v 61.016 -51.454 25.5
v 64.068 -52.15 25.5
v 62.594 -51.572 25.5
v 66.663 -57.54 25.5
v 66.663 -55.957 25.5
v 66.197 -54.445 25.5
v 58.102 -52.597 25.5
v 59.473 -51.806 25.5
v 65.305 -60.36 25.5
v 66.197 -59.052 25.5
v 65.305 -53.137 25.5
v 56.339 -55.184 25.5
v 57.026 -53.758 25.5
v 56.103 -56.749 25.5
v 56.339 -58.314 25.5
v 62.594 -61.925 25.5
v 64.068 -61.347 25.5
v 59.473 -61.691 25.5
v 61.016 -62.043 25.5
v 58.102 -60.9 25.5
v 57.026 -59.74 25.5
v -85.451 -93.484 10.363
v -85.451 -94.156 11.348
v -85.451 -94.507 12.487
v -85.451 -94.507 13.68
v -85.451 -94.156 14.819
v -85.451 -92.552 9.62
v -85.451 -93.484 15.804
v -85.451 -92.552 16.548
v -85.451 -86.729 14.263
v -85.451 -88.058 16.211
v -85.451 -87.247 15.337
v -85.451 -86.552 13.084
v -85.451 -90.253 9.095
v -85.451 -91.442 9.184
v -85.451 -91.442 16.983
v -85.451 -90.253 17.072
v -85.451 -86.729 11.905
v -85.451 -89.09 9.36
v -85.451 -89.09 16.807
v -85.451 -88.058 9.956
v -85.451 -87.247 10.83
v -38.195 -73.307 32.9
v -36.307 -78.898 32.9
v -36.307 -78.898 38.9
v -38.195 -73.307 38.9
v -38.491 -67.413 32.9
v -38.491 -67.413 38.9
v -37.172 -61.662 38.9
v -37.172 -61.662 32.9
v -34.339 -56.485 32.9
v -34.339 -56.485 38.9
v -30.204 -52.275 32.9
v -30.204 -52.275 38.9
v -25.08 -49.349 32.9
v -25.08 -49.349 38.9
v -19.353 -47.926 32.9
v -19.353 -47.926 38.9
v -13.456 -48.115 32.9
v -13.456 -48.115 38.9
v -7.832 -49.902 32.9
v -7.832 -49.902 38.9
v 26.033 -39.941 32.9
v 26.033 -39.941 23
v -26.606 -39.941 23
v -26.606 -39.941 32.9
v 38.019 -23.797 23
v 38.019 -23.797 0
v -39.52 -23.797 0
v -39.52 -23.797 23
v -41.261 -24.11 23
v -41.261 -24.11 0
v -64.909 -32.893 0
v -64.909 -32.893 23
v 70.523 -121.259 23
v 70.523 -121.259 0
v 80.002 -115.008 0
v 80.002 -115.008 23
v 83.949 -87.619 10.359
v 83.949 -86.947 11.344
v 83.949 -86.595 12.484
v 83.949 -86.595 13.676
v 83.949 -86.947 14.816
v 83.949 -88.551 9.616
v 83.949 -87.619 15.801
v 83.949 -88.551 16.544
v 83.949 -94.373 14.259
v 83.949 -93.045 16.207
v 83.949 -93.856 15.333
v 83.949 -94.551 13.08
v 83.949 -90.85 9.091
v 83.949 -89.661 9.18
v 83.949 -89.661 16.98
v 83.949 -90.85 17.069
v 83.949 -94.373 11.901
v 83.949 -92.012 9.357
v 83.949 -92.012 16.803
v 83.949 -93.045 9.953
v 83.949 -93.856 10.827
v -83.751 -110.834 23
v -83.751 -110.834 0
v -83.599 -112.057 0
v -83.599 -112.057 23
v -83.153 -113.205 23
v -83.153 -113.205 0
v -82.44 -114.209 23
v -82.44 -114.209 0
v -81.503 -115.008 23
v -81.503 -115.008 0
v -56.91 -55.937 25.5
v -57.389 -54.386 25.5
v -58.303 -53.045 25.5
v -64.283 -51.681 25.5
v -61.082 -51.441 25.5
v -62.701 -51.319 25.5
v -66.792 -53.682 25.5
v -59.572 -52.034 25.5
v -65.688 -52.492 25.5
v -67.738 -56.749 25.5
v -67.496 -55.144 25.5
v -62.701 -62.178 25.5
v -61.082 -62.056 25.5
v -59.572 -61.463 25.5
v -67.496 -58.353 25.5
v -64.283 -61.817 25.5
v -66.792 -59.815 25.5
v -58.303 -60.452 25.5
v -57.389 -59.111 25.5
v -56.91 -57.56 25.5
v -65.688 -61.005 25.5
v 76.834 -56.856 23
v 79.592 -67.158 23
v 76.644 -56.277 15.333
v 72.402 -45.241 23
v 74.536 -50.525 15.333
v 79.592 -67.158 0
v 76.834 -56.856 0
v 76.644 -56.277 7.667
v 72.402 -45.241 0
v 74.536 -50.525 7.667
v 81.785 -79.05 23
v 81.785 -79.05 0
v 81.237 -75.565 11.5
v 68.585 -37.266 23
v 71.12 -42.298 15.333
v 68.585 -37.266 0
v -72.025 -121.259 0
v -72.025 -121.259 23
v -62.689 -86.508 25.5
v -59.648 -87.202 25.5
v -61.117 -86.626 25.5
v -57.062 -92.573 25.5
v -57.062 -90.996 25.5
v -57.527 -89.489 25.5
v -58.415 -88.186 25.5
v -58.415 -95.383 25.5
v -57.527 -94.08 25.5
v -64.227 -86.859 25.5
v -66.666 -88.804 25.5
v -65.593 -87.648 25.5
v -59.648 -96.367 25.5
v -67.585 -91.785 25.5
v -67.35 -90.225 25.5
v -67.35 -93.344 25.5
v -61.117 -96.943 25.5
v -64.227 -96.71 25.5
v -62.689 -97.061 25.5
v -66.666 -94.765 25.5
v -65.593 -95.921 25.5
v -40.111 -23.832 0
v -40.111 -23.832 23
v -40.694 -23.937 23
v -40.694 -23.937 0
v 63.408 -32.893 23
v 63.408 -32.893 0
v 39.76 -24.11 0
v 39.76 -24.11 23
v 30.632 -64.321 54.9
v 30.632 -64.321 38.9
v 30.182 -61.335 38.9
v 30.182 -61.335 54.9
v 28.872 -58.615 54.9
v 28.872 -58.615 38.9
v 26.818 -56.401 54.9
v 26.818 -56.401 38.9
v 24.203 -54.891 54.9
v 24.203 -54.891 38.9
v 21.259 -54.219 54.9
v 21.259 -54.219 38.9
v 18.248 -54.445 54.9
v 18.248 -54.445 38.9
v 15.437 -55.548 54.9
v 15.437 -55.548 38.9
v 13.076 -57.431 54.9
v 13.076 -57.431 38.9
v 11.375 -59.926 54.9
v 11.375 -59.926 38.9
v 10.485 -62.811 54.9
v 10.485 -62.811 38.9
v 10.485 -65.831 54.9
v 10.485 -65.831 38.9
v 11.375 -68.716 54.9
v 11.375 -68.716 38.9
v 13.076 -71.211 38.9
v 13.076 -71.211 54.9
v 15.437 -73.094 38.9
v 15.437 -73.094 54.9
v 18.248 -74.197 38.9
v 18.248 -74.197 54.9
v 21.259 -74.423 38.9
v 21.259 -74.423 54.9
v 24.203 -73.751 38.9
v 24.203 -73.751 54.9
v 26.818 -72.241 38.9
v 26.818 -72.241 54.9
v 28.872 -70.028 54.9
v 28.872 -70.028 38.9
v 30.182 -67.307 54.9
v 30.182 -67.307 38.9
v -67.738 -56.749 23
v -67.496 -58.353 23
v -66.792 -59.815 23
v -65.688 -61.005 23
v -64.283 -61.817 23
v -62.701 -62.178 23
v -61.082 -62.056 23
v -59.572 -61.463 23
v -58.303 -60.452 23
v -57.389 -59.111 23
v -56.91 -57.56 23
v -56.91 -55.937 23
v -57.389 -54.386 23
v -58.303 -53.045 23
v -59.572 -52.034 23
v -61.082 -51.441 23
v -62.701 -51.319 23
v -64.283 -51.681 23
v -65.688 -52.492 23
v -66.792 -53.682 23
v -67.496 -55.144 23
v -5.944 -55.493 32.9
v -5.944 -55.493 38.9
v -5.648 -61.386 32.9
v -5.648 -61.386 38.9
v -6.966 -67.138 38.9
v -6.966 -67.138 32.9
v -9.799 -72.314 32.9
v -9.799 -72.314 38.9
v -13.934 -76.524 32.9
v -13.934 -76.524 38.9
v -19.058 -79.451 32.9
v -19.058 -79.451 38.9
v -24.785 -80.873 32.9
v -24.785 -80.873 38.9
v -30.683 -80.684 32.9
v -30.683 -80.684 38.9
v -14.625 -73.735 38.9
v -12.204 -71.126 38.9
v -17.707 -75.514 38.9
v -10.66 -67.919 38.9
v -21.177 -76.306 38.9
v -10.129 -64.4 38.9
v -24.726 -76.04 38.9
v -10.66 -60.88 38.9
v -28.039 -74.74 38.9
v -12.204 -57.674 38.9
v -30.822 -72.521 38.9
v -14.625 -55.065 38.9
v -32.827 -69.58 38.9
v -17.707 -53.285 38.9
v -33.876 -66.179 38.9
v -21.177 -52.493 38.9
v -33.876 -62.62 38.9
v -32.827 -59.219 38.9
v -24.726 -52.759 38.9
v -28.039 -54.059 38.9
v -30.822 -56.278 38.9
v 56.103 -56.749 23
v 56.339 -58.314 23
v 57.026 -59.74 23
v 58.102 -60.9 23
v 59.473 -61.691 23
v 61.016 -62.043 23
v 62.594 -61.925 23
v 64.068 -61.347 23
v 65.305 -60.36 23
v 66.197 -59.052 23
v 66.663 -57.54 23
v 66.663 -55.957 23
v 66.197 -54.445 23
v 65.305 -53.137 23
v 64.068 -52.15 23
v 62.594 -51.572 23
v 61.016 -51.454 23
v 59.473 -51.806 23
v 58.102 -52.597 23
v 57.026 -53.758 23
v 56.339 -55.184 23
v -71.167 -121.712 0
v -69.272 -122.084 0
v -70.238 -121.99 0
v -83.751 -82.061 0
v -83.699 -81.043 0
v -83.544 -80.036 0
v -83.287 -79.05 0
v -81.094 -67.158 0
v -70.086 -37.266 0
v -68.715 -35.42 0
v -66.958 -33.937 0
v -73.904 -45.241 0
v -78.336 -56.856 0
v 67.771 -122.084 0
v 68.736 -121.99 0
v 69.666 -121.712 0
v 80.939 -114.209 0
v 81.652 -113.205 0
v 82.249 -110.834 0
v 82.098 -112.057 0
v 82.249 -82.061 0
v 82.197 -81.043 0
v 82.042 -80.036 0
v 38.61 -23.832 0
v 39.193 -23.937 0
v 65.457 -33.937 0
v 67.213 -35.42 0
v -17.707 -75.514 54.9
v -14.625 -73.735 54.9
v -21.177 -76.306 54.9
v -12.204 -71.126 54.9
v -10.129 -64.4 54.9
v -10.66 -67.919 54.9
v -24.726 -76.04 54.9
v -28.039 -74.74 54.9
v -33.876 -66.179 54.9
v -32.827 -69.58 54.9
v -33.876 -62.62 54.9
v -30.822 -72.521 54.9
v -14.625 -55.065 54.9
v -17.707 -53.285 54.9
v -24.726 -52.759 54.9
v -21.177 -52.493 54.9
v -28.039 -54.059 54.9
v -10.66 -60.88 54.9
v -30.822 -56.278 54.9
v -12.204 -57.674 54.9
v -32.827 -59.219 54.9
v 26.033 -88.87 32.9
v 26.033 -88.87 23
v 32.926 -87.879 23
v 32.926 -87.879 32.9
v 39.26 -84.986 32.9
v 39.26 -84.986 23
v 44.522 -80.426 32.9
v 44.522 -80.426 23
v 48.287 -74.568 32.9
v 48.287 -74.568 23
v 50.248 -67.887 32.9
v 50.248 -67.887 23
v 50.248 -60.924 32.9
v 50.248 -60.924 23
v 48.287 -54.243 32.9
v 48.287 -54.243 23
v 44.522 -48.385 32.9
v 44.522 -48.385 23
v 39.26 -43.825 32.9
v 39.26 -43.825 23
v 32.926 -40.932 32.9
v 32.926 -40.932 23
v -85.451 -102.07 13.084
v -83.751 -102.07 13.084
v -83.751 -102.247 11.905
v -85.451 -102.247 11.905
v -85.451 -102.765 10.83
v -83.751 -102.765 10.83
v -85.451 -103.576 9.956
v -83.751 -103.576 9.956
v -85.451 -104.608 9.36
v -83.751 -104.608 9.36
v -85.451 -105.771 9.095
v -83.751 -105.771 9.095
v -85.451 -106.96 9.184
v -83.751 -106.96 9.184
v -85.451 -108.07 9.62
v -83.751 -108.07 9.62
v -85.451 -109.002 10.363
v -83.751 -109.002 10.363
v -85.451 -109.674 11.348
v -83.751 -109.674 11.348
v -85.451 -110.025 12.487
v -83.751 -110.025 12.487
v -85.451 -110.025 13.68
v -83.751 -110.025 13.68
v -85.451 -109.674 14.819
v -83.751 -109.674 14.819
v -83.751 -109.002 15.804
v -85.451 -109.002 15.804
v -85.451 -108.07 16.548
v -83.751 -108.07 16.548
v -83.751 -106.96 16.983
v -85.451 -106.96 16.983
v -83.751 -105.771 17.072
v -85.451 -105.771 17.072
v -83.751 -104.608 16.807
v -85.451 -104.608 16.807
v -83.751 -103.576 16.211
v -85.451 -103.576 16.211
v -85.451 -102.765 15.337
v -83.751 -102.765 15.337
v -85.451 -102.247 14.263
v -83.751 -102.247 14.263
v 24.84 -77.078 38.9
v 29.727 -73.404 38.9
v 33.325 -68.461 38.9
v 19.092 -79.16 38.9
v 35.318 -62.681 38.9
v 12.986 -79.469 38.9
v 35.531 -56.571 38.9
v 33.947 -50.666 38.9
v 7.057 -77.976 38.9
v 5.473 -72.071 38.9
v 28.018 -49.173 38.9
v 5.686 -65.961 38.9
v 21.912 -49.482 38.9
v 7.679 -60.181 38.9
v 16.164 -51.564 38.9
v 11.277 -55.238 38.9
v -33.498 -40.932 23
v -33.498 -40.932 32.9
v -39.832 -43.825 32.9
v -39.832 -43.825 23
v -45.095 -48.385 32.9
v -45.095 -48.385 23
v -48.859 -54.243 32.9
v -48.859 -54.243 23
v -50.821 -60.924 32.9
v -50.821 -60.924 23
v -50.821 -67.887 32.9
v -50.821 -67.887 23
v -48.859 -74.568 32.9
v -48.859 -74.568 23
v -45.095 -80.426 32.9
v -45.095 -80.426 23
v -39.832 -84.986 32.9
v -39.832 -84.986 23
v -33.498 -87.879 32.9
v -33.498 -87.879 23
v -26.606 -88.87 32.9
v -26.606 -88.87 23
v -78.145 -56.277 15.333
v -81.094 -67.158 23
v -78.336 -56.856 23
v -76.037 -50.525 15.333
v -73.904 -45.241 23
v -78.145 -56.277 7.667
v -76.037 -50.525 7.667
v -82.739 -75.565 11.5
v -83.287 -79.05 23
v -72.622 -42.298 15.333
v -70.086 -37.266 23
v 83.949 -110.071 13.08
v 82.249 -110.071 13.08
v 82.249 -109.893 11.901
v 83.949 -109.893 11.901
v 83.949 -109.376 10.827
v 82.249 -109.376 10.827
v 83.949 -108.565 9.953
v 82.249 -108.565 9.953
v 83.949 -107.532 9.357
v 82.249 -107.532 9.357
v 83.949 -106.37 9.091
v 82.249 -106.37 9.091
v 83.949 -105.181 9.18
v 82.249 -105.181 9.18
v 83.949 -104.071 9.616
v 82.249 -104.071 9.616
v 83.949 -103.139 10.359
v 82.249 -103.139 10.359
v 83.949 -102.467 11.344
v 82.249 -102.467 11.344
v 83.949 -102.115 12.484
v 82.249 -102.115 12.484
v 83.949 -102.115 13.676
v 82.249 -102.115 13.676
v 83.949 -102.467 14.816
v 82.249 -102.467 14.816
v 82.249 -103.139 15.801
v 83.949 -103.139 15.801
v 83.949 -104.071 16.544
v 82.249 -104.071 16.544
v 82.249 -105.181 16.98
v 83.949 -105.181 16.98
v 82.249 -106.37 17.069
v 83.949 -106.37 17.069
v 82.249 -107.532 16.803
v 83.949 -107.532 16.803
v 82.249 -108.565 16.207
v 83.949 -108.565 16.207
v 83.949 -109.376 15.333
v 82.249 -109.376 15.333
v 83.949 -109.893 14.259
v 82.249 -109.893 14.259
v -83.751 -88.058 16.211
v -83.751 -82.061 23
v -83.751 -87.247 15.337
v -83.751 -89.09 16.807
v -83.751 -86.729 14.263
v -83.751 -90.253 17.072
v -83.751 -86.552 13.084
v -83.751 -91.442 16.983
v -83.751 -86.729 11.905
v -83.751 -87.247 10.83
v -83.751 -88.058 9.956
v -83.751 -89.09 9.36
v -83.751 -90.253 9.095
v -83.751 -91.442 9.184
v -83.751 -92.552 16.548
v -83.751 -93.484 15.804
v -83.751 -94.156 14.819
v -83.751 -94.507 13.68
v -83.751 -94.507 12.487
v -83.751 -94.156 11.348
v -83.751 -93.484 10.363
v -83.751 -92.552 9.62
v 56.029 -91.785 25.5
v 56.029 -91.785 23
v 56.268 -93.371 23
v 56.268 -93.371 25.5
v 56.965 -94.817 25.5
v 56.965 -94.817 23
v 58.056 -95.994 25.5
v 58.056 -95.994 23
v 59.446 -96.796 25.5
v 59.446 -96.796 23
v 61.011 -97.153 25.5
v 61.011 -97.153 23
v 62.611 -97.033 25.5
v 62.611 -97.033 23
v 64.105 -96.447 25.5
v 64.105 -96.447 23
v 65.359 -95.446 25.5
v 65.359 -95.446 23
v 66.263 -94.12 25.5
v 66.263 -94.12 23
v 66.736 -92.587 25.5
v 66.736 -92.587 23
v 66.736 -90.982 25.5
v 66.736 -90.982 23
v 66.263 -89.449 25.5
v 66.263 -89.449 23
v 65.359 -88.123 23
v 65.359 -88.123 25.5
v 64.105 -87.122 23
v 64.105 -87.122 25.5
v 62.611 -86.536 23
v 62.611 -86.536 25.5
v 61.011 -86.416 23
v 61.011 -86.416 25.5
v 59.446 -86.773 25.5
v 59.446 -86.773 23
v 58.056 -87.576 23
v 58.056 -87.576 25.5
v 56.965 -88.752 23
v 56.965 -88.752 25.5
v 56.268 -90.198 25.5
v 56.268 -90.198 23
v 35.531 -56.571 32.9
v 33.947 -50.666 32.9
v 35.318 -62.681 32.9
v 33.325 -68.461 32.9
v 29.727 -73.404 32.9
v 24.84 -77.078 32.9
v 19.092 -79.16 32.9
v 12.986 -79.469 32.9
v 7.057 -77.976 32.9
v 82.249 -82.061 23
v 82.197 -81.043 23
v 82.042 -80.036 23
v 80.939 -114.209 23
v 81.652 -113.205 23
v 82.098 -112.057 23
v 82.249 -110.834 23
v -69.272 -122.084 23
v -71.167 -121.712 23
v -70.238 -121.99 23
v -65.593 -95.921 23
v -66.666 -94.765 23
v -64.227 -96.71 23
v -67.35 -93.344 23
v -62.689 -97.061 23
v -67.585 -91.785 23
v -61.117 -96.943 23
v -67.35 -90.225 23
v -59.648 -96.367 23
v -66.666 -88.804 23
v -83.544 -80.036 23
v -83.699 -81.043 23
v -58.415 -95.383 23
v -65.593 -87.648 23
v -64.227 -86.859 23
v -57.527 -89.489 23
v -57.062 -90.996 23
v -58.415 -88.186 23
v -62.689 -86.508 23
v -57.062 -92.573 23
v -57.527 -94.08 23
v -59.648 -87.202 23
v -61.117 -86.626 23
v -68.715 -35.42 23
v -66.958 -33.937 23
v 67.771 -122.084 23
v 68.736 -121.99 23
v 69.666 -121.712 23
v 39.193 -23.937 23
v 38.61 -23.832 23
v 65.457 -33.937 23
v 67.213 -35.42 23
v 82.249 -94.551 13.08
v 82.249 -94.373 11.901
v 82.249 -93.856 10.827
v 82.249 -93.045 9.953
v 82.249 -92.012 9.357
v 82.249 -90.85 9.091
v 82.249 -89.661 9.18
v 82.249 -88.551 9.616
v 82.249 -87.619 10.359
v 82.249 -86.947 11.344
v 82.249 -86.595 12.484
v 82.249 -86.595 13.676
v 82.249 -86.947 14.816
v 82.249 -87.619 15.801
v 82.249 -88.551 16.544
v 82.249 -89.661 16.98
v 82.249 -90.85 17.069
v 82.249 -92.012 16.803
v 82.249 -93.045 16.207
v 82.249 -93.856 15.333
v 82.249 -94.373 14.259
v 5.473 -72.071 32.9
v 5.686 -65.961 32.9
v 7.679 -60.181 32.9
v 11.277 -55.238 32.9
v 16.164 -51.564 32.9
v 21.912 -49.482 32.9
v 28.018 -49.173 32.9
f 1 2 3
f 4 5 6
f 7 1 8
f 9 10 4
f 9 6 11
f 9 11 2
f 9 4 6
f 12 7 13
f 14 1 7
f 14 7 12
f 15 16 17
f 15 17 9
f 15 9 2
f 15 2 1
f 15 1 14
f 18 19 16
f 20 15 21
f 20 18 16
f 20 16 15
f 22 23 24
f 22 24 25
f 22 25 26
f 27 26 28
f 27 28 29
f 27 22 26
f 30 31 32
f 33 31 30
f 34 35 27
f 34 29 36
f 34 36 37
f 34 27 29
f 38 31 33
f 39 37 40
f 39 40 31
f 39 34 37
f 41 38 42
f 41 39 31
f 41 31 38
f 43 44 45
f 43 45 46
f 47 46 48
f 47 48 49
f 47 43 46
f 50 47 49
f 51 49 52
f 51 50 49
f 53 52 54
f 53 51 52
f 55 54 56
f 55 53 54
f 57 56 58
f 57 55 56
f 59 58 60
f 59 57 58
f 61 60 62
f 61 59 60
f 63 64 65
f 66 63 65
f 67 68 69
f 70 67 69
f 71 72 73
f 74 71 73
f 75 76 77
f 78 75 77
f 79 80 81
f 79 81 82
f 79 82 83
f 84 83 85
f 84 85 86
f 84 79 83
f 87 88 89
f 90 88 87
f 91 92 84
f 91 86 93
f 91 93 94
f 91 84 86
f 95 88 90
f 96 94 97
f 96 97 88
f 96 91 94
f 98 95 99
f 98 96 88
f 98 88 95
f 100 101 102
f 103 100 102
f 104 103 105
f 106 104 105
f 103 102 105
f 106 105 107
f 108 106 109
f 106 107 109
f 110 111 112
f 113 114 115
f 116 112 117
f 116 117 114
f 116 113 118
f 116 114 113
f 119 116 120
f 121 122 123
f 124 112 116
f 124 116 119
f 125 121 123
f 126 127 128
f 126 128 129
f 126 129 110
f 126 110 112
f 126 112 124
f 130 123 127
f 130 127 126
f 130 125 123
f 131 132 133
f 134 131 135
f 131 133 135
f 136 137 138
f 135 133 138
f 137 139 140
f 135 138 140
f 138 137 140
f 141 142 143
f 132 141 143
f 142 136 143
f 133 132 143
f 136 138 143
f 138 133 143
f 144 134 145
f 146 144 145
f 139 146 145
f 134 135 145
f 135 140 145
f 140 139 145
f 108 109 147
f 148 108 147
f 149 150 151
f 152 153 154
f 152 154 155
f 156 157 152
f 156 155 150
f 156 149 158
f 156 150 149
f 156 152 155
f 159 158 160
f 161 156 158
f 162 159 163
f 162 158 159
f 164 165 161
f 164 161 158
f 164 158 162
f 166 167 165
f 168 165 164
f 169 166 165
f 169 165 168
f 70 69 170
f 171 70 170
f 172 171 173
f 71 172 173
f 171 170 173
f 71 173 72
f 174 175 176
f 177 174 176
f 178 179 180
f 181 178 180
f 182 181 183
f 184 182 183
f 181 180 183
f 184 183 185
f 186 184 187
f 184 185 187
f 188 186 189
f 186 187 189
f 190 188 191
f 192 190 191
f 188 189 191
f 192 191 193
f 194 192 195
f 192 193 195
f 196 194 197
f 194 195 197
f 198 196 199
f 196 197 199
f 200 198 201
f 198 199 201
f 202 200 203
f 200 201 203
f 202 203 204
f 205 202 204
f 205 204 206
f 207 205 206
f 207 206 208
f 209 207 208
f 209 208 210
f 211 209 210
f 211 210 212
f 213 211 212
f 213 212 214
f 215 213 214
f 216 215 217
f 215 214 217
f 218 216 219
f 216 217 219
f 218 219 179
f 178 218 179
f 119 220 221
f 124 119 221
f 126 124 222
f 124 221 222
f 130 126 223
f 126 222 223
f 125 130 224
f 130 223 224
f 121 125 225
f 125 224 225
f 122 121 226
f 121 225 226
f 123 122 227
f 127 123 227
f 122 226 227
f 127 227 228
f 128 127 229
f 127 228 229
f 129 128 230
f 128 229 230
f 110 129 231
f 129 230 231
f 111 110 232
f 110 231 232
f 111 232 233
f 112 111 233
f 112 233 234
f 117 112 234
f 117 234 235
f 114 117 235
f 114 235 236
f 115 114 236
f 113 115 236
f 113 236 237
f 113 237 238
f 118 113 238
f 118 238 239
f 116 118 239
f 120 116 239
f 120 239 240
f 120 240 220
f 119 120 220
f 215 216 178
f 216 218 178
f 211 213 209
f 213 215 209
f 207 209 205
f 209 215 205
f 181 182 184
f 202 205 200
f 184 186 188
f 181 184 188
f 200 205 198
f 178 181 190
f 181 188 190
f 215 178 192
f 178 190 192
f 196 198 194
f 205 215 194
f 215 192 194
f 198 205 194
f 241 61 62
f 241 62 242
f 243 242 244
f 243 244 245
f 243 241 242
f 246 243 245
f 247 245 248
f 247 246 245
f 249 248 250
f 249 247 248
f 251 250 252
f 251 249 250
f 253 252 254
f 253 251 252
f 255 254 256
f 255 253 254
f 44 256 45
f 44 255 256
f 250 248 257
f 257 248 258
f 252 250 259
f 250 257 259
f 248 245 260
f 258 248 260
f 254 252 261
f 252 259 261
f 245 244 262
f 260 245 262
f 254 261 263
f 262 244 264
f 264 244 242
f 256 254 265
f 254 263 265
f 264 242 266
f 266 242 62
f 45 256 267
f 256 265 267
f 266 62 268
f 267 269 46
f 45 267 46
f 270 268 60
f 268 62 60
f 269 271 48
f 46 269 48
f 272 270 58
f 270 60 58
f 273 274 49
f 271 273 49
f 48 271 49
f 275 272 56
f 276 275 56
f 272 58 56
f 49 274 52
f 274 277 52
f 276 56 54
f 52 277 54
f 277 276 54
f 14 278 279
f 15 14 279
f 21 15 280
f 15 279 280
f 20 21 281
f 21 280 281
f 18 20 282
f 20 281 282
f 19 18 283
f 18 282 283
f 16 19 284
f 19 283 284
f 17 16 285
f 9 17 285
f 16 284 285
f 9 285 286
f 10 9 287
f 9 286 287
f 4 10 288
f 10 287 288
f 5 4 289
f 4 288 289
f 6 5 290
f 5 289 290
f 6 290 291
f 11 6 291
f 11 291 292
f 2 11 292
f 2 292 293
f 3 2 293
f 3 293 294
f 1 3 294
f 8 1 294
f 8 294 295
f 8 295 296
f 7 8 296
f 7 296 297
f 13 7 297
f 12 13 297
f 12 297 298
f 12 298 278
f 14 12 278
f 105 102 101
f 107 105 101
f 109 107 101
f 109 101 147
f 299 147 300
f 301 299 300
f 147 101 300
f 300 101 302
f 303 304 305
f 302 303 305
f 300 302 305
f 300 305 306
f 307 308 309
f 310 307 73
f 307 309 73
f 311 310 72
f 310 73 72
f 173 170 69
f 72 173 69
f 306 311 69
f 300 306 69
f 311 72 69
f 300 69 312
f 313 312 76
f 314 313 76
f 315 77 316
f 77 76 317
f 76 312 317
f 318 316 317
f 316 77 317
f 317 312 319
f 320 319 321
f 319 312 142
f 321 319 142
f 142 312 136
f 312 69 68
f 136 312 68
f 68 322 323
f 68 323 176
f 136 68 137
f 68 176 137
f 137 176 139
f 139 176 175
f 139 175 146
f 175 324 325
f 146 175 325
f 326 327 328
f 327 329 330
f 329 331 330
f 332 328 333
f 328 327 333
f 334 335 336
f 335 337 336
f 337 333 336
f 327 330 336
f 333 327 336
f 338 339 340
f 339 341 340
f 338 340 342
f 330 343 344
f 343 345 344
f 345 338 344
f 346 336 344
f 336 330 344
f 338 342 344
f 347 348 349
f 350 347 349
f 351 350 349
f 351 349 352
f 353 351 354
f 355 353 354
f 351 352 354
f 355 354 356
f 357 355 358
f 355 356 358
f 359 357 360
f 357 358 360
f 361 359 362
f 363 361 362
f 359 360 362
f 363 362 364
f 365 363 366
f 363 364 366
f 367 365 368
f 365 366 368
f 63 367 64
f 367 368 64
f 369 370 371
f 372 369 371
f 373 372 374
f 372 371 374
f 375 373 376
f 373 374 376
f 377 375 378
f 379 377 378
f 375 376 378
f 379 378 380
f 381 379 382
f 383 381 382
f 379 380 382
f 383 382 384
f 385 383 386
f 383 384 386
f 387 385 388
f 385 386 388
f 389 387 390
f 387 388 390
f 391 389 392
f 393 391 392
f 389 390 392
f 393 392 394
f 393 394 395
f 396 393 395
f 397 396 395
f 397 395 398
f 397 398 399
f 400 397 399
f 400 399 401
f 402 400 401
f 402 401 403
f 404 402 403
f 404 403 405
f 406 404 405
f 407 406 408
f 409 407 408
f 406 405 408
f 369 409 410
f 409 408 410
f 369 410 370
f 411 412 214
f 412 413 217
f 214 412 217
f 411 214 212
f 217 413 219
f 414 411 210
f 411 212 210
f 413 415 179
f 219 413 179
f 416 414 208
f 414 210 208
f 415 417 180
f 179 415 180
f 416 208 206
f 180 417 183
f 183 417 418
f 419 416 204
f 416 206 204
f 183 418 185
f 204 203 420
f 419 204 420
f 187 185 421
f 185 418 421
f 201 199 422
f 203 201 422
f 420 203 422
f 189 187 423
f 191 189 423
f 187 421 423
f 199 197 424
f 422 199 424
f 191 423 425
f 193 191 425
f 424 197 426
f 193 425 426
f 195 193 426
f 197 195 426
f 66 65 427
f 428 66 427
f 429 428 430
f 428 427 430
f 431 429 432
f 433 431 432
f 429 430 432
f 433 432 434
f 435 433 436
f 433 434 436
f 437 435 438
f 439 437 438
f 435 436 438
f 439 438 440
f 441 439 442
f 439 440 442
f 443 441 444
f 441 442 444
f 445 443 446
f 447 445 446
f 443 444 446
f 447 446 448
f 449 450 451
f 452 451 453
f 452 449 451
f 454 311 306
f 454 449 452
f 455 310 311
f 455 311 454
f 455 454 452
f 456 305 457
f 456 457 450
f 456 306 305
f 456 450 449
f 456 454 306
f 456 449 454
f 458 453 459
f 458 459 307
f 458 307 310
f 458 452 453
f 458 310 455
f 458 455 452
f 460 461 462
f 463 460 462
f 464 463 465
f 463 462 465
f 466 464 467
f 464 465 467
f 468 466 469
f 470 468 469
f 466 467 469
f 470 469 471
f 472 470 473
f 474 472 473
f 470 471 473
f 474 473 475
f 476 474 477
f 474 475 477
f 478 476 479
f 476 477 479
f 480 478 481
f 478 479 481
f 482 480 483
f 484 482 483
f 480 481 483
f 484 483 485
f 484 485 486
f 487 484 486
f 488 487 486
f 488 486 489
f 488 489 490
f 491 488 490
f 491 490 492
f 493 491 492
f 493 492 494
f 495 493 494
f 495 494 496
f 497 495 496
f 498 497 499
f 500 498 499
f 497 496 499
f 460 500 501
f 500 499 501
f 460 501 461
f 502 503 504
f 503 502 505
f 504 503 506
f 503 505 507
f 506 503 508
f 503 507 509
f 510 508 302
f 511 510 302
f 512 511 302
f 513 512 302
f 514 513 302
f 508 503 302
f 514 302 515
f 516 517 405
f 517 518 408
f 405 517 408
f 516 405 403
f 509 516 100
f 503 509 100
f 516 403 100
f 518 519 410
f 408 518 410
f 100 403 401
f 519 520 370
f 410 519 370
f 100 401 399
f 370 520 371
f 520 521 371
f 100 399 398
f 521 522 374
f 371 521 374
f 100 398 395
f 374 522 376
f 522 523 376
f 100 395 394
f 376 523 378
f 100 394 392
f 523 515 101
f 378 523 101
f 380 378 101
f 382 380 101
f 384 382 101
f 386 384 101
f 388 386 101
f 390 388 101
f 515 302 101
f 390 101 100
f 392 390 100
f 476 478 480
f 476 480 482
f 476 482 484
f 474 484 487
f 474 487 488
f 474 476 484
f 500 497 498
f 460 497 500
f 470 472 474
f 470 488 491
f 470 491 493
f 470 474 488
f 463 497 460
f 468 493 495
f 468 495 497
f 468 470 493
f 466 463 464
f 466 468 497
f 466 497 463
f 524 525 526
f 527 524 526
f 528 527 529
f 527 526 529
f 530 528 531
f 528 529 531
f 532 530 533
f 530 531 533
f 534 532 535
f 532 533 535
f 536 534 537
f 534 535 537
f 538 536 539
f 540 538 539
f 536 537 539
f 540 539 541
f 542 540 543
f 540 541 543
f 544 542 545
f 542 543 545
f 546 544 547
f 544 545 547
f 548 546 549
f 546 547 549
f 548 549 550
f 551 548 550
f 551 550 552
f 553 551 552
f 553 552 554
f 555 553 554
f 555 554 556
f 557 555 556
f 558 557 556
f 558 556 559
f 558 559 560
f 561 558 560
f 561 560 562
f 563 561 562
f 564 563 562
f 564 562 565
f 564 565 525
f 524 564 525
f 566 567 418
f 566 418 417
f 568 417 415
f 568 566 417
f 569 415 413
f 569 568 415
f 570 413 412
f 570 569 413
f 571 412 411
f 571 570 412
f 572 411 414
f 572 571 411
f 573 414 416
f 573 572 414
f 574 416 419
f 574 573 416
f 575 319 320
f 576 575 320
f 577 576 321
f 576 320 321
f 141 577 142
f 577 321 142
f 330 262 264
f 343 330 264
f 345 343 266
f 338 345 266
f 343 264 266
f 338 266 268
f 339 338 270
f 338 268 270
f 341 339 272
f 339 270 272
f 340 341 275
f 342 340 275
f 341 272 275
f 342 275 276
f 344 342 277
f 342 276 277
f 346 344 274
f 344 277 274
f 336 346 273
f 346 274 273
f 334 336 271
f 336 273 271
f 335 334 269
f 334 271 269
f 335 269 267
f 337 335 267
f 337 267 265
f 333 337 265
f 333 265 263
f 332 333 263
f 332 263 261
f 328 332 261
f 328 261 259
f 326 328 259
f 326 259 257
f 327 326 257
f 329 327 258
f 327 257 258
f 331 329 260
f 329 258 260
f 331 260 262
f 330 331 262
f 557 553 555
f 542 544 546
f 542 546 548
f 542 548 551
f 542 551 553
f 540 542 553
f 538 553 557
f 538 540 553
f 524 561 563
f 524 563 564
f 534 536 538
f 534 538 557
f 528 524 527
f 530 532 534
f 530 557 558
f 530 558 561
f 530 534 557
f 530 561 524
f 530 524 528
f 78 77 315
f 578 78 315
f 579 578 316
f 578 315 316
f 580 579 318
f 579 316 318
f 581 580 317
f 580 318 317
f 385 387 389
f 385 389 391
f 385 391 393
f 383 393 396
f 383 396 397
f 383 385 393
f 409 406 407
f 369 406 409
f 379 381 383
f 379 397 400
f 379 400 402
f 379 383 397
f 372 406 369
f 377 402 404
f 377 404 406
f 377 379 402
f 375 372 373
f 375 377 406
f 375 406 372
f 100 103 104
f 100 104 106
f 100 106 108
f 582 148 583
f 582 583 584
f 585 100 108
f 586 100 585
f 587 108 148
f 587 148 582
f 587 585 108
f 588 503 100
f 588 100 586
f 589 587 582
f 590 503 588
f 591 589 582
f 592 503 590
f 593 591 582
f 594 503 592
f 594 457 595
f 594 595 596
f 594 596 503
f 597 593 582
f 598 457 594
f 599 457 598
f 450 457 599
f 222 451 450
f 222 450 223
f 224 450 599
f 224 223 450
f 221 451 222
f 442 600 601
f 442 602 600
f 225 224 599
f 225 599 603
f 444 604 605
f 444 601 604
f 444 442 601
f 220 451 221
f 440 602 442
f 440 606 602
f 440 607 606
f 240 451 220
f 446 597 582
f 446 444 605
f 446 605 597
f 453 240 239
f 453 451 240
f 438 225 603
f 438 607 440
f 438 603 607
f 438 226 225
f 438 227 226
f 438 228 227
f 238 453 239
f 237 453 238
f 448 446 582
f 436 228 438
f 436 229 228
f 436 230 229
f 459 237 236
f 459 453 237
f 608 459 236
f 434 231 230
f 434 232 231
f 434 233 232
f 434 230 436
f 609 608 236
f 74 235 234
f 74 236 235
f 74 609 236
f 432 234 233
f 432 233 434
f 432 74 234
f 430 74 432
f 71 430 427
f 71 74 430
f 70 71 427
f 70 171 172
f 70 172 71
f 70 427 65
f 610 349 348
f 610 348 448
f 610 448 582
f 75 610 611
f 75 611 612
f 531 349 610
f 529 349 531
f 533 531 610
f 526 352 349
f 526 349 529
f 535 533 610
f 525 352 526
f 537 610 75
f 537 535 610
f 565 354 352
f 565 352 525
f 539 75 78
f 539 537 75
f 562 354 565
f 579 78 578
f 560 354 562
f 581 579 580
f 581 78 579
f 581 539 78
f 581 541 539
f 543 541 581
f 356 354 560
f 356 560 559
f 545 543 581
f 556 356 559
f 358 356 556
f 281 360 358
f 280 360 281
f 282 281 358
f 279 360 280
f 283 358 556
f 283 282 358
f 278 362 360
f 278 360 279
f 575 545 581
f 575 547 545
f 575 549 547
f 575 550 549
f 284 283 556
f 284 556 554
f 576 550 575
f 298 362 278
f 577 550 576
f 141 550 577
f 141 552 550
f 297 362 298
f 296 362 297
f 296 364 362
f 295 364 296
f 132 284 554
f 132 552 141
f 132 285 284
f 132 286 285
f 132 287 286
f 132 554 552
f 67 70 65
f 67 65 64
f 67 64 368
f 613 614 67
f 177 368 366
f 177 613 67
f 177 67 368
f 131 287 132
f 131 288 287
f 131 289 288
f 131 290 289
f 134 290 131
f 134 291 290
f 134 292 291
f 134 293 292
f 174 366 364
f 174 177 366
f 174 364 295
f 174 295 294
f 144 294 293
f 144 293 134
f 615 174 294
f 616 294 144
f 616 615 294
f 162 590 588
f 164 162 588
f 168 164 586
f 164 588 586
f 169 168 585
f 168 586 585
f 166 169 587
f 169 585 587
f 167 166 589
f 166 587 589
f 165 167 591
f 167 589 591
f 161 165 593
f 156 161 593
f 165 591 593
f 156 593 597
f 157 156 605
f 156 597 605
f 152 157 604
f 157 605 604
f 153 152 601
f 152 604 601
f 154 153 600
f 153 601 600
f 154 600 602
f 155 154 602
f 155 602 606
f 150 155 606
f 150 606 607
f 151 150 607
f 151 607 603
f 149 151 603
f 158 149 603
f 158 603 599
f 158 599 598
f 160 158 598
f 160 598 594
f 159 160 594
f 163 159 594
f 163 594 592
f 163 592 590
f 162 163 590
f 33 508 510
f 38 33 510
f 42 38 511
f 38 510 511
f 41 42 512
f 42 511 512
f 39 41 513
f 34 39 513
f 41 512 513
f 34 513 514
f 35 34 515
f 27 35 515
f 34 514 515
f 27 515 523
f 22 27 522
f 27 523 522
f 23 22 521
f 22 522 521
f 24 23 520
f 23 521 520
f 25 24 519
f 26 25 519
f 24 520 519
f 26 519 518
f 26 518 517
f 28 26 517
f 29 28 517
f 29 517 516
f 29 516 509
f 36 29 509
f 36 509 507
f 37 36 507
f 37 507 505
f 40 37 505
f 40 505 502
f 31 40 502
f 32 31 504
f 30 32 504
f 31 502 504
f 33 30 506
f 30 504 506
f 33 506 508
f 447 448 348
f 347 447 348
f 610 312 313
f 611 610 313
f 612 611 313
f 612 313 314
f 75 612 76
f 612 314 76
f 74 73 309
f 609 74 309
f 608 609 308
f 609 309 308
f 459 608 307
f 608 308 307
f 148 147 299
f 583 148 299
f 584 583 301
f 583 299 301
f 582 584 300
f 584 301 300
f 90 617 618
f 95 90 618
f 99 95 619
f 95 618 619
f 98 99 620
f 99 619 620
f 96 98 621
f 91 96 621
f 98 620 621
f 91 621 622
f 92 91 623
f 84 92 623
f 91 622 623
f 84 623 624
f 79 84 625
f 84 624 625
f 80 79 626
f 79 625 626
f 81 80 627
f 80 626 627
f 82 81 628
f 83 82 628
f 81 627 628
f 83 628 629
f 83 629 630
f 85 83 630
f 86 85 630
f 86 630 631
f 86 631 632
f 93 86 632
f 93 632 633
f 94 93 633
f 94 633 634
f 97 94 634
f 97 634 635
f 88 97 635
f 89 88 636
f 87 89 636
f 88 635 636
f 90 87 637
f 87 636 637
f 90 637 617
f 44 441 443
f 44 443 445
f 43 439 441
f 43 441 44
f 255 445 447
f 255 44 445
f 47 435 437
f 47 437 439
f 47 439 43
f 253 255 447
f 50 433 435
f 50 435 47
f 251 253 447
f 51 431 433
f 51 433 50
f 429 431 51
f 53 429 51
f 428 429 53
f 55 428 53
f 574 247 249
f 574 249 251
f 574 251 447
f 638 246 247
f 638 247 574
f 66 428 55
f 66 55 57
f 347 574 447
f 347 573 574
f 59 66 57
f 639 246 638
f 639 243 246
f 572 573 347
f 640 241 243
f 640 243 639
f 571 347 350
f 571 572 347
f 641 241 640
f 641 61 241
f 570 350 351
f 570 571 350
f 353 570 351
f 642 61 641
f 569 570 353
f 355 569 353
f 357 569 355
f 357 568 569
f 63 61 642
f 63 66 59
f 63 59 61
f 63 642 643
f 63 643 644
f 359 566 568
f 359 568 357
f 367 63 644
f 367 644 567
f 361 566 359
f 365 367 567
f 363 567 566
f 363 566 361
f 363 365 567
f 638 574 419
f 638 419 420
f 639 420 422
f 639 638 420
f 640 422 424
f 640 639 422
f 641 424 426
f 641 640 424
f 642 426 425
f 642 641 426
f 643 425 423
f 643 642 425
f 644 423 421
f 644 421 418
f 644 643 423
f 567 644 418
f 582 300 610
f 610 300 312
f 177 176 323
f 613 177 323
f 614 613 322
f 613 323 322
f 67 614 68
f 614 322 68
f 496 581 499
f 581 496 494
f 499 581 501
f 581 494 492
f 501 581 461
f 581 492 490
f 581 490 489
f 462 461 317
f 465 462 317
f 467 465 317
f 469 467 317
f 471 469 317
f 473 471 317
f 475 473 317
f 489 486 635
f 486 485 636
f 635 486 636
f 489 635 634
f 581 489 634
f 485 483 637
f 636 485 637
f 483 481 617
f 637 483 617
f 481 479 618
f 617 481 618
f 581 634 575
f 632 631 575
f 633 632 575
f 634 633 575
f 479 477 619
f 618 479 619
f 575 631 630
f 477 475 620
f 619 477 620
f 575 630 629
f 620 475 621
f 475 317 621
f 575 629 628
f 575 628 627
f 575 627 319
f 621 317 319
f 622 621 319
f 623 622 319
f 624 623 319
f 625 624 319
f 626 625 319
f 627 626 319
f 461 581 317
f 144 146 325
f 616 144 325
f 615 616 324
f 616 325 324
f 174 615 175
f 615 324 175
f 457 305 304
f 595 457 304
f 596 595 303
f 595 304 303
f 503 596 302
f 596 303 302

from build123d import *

# Parameters (mm, degrees)
BOSS_EXTRUDE1_DEPTH = 23
SKETCH5_R           = 4
BOSS_EXTRUDE3_DEPTH = 1.7
SKETCH8_R           = 4
BOSS_EXTRUDE4_DEPTH = 1.7
SKETCH12_R          = 5.309585237
SKETCH12_R_2        = 5.383577716
SKETCH12_R_3        = 5.290961271
SKETCH12_R_4        = 5.444301549
BOSS_EXTRUDE5_DEPTH = 9.9
BOSS_EXTRUDE6_DEPTH = 22
CUT_EXTRUDE1_START  = -16
SKETCH16_R          = 11.94
CUT_EXTRUDE1_DEPTH  = 16
CUT_EXTRUDE2_START  = -16
SKETCH17_R          = 10.13
CUT_EXTRUDE2_DEPTH  = 16
CUT_EXTRUDE3_START  = -7.4
SKETCH18_R          = 5.309585237
CUT_EXTRUDE3_DEPTH  = 7.4
CUT_EXTRUDE4_START  = -7.4
SKETCH19_R          = 5.383577716
CUT_EXTRUDE4_DEPTH  = 7.4
CUT_EXTRUDE5_START  = -7.4
SKETCH20_R          = 5.444301549
CUT_EXTRUDE5_DEPTH  = 7.4
CUT_EXTRUDE6_START  = -7.4
SKETCH21_R          = 5.290961271
CUT_EXTRUDE6_DEPTH  = 7.4


with BuildPart() as part:
    # Sketch2 → Boss-Extrude1 (new body)
    with BuildSketch(Plane.XY):
        with BuildLine():
            Line((70.523413182, -121.258597495), (80.001788964, -115.008475165))
            ThreePointArc((80.001788964, -115.008475165), (81.651709385, -113.204688447), (82.249297777, -110.834293536))
            Line((82.249297777, -110.834293536), (82.249297777, -82.060728072))
            ThreePointArc((82.249297777, -82.060728072), (82.132627635, -80.537642087), (81.785339594, -79.050095835))
            add(Edge.make_bspline(
                [(81.785339594, -79.050095835), (81.779550585, -79.03175941), (79.763594577, -64.21980724), (72.310783114, -44.632084365), (70.089271073, -39.87053002), (68.584818962, -37.26596578)],
                knots=[0.01010668, 0.01010668, 0.01010668, 0.01010668, 0.430228508, 0.512694162, 0.834763224, 0.834763224, 0.834763224, 0.834763224], degree=3))
            ThreePointArc((68.584818962, -37.26596578), (66.377835563, -34.627803803), (63.407507036, -32.893496223))
            Line((63.407507036, -32.893496223), (39.759590264, -24.109812278))
            ThreePointArc((39.759590264, -24.109812278), (38.90305511, -23.875770322), (38.018627658, -23.796927511))
            Line((38.018627658, -23.796927511), (-39.520032104, -23.796927511))
            ThreePointArc((-39.520032104, -23.796927511), (-40.404459556, -23.875770322), (-41.26099471, -24.109812278))
            Line((-41.26099471, -24.109812278), (-64.908911482, -32.893496223))
            ThreePointArc((-64.908911482, -32.893496223), (-67.879240009, -34.627803803), (-70.086223408, -37.26596578))
            add(Edge.make_bspline(
                [(-83.28674404, -79.050095835), (-83.280955031, -79.03175941), (-81.264999023, -64.21980724), (-73.81218756, -44.632084365), (-71.590675519, -39.87053002), (-70.086223408, -37.26596578)],
                knots=[0.01010668, 0.01010668, 0.01010668, 0.01010668, 0.430228508, 0.512694162, 0.834763224, 0.834763224, 0.834763224, 0.834763224], degree=3))
            ThreePointArc((-83.28674404, -79.050095835), (-83.634032081, -80.537642087), (-83.750702223, -82.060728072))
            Line((-83.750702223, -82.060728072), (-83.750702223, -110.834293536))
            ThreePointArc((-83.750702223, -110.834293536), (-83.153113831, -113.204688447), (-81.50319341, -115.008475165))
            Line((-81.50319341, -115.008475165), (-72.024817629, -121.258597495))
            ThreePointArc((-72.024817629, -121.258597495), (-70.709179228, -121.873513284), (-69.272326442, -122.084415867))
            Line((-69.272326442, -122.084415867), (67.770921996, -122.084415867))
            ThreePointArc((67.770921996, -122.084415867), (69.207774782, -121.873513284), (70.523413182, -121.258597495))
        make_face()
    extrude(amount=BOSS_EXTRUDE1_DEPTH)

    # Sketch5 → Boss-Extrude3 (add)
    with BuildSketch(Plane.ZY.offset(83.750702223)):
        with Locations(Location((13.083649818, -90.551709518, 0), (0, 0, 90))):
            Circle(SKETCH5_R)
        with Locations(Location((13.083649818, -106.069633318, 0), (0, 0, 90))):
            Circle(SKETCH5_R)
    extrude(amount=BOSS_EXTRUDE3_DEPTH)

    # Sketch8 → Boss-Extrude4 (add)
    with BuildSketch(Plane(origin=(82.249297777, 0, 0), x_dir=(0, 0, -1), z_dir=(1, 0, 0))):
        with Locations(Location((-13.08, -90.550728072, 0), (0, 0, 270))):
            Circle(SKETCH8_R)
        with Locations(Location((-13.08, -106.070728072, 0), (0, 0, 270))):
            Circle(SKETCH8_R)
    extrude(amount=BOSS_EXTRUDE4_DEPTH)

    # Sketch12 → Boss-Extrude5 (add)
    with BuildSketch(Plane.XY.offset(23)):
        with Locations(Location((61.412858859, -56.74856372, 0), (0, 0, 180))):
            Circle(SKETCH12_R)
        with Locations(Location((61.412858859, -91.784557501, 0), (0, 0, 180))):
            Circle(SKETCH12_R_2)
        with Locations(Location((-62.293922582, -91.784557501, 0), (0, 0, 180))):
            Circle(SKETCH12_R_3)
        with Locations(Location((-62.293922582, -56.74856372, 0), (0, 0, 180))):
            Circle(SKETCH12_R_4)
        with BuildLine():
            Line((26.03317791, -39.941081705), (-26.605656617, -39.941081705))
            ThreePointArc((-26.605656617, -39.941081705), (-51.069934746, -64.405359834), (-26.605656617, -88.869637962))
            Line((-26.605656617, -88.869637962), (26.03317791, -88.869637962))
            ThreePointArc((26.03317791, -88.869637962), (50.497456038, -64.405359834), (26.03317791, -39.941081705))
        make_face()
    extrude(amount=BOSS_EXTRUDE5_DEPTH)

    # Sketch15 → Boss-Extrude6 (add)
    with BuildSketch(Plane.XY.offset(32.9)):
        with BuildLine():
            ThreePointArc((-36.30694092, -78.897586955), (-32.416918561, -54.237740907), (-7.831564022, -49.901772358))
            ThreePointArc((-7.831564022, -49.901772358), (-11.721586381, -74.561618406), (-36.30694092, -78.897586955))
        make_face()
        with BuildLine():
            ThreePointArc((33.947027157, -50.665986501), (29.727203797, -73.404384895), (7.056950152, -77.976175614))
            ThreePointArc((7.056950152, -77.976175614), (11.276773512, -55.23777722), (33.947027157, -50.665986501))
        make_face()
    extrude(amount=BOSS_EXTRUDE6_DEPTH)

    # Sketch16 → Cut-Extrude1 (cut)
    with BuildSketch(Plane.XY.offset(54.9).offset(CUT_EXTRUDE1_START)):
        with BuildLine():
            ThreePointArc((-36.30694092, -78.897586955), (-32.416918561, -54.237740907), (-7.831564022, -49.901772358))
            ThreePointArc((-7.831564022, -49.901772358), (-11.721586381, -74.561618406), (-36.30694092, -78.897586955))
        make_face()
        with Locations((-22.069252471, -64.399679657)):
            Circle(SKETCH16_R, mode=Mode.SUBTRACT)
    extrude(amount=CUT_EXTRUDE1_DEPTH, mode=Mode.SUBTRACT)

    # Sketch17 → Cut-Extrude2 (cut)
    with BuildSketch(Plane.XY.offset(54.9).offset(CUT_EXTRUDE2_START)):
        with BuildLine():
            ThreePointArc((7.056950152, -77.976175614), (11.276773512, -55.23777722), (33.947027157, -50.665986501))
            ThreePointArc((33.947027157, -50.665986501), (29.727203797, -73.404384895), (7.056950152, -77.976175614))
        make_face()
        with Locations((20.501988655, -64.321081058)):
            Circle(SKETCH17_R, mode=Mode.SUBTRACT)
    extrude(amount=CUT_EXTRUDE2_DEPTH, mode=Mode.SUBTRACT)

    # Sketch18 → Cut-Extrude3 (cut)
    with BuildSketch(Plane.XY.offset(32.9).offset(CUT_EXTRUDE3_START)):
        with Locations(Location((61.412858859, -56.74856372, 0), (0, 0, 180))):
            Circle(SKETCH18_R)
    extrude(amount=CUT_EXTRUDE3_DEPTH, mode=Mode.SUBTRACT)

    # Sketch19 → Cut-Extrude4 (cut)
    with BuildSketch(Plane.XY.offset(32.9).offset(CUT_EXTRUDE4_START)):
        with Locations(Location((61.412858859, -91.784557501, 0), (0, 0, 180))):
            Circle(SKETCH19_R)
    extrude(amount=CUT_EXTRUDE4_DEPTH, mode=Mode.SUBTRACT)

    # Sketch20 → Cut-Extrude5 (cut)
    with BuildSketch(Plane.XY.offset(32.9).offset(CUT_EXTRUDE5_START)):
        with Locations(Location((-62.293922582, -56.74856372, 0), (0, 0, 180))):
            Circle(SKETCH20_R)
    extrude(amount=CUT_EXTRUDE5_DEPTH, mode=Mode.SUBTRACT)

    # Sketch21 → Cut-Extrude6 (cut)
    with BuildSketch(Plane.XY.offset(32.9).offset(CUT_EXTRUDE6_START)):
        with Locations(Location((-62.293922582, -91.784557501, 0), (0, 0, 180))):
            Circle(SKETCH21_R)
    extrude(amount=CUT_EXTRUDE6_DEPTH, mode=Mode.SUBTRACT)


solid = part.part
